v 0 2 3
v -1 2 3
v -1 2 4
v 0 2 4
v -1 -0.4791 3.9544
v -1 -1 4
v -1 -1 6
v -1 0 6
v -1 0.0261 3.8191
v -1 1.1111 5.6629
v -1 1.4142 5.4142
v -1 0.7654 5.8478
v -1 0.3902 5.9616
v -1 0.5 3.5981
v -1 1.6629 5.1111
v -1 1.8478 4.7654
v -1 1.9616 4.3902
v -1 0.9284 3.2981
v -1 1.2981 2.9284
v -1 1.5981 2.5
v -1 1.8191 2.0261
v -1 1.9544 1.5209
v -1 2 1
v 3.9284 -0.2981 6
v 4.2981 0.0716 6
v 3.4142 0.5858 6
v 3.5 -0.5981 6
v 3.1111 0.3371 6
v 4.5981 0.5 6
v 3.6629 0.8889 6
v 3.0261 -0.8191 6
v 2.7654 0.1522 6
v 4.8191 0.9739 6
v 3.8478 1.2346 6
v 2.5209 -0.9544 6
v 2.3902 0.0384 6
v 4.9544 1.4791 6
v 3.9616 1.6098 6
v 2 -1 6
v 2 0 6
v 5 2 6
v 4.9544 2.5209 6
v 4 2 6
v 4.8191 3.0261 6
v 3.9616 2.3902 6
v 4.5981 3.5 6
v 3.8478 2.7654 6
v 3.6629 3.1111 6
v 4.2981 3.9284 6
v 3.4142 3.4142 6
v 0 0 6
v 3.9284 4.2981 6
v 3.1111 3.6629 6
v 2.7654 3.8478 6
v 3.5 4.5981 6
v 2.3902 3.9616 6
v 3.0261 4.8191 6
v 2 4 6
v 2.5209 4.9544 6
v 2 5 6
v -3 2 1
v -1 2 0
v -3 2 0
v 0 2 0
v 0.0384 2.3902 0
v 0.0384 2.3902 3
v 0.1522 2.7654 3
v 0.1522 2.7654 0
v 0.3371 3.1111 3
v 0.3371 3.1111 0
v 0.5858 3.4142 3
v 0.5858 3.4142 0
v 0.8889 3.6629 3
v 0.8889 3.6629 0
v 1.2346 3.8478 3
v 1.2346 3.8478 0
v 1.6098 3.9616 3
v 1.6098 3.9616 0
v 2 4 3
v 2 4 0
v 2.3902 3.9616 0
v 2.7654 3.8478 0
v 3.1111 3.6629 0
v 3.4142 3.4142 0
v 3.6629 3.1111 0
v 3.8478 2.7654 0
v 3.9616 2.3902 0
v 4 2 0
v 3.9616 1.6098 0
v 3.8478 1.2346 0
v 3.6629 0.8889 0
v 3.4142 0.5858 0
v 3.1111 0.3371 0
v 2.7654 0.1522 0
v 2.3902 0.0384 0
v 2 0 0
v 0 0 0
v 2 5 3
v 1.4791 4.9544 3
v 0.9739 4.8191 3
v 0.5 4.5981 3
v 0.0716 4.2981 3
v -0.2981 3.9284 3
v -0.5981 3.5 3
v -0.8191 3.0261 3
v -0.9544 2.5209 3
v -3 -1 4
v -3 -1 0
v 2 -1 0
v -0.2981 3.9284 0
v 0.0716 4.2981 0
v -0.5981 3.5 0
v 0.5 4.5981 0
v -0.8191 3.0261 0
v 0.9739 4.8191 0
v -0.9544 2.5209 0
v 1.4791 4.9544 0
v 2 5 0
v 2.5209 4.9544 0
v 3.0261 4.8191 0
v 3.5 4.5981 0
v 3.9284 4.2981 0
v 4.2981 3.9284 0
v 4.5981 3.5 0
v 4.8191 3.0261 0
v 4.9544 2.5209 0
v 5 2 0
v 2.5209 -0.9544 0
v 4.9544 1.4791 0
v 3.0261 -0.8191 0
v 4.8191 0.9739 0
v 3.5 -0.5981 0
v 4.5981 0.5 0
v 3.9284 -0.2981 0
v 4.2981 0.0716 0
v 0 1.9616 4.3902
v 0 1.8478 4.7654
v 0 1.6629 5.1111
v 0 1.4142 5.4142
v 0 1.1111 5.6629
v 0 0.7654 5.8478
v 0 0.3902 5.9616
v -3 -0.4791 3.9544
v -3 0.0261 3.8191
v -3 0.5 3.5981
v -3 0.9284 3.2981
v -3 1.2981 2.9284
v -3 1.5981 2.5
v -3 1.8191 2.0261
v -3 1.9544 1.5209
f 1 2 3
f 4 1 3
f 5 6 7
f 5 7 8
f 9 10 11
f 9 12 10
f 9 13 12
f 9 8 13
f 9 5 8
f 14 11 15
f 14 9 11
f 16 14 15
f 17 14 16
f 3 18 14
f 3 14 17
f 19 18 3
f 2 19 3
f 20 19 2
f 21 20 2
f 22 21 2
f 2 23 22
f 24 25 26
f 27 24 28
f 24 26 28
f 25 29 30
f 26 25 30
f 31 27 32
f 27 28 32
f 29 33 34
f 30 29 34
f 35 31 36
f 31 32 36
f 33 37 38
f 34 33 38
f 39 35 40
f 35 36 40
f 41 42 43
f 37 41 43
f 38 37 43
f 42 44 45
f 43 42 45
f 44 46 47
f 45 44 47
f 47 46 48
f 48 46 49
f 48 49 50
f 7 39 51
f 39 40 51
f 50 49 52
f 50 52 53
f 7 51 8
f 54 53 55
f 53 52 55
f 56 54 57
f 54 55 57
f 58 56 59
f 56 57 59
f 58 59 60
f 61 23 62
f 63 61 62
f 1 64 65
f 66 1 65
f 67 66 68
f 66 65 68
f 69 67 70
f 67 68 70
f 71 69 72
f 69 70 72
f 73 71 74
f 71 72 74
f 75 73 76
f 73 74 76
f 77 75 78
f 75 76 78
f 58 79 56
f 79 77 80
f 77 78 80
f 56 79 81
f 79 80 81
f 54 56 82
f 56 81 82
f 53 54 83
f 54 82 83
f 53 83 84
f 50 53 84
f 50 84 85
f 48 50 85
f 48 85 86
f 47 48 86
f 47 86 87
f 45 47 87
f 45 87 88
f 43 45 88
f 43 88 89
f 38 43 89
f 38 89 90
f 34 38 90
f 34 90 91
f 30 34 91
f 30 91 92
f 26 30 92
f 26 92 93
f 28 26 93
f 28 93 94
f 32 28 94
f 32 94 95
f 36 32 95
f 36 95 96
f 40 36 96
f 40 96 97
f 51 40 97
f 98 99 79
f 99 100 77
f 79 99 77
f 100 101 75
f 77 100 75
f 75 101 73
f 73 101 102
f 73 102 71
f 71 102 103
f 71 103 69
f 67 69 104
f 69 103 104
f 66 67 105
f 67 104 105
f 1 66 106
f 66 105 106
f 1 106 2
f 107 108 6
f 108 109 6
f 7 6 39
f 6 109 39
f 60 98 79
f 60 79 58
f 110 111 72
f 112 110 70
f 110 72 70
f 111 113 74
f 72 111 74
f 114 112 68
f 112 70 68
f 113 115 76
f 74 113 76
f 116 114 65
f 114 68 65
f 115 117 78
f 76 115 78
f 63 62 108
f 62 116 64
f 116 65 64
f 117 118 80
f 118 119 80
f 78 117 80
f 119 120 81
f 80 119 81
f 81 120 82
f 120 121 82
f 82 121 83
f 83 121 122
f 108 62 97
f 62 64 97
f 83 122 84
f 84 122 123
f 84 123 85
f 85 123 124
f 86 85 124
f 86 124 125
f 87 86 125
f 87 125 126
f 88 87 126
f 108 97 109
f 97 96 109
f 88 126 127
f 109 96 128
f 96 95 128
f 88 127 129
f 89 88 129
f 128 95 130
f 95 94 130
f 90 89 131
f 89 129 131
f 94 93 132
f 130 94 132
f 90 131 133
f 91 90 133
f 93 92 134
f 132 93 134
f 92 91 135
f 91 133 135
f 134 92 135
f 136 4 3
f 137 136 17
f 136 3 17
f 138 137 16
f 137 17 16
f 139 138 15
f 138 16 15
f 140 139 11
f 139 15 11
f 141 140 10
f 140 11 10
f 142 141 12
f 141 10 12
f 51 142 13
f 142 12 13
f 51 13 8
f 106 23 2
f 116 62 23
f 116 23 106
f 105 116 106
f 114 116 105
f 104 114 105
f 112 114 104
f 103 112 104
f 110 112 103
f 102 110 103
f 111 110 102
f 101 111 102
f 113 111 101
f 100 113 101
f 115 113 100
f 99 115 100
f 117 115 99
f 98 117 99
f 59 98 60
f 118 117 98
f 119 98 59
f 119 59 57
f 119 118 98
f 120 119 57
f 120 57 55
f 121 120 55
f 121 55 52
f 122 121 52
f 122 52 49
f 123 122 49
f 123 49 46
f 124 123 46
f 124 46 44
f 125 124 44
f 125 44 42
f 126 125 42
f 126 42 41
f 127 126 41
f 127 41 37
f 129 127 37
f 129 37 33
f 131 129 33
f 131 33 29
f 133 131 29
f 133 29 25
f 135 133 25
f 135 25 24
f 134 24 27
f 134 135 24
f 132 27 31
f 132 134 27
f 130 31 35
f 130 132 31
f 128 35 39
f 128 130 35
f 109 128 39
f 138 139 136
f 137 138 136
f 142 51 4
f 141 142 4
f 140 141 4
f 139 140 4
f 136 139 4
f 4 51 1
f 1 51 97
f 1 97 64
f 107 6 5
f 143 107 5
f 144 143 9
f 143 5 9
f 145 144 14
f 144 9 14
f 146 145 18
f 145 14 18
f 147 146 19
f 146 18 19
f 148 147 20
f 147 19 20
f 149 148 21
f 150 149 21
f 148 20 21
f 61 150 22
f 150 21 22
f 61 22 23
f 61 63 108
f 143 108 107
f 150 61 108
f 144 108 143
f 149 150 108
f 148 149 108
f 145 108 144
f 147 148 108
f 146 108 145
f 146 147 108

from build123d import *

# Parameters (mm, degrees)
BOSS_EXTRUDE1_DEPTH = 6
BOSS_EXTRUDE2_DEPTH = 2
CUT_EXTRUDE1_DEPTH  = 3


with BuildPart() as part:
    # Sketch2 → Boss-Extrude1 (new body)
    with BuildSketch(Plane.XY):
        with BuildLine():
            ThreePointArc((-1, 2), (4.121320344, 4.121320344), (2, -1))
            Line((2, -1), (-1, -1))
            Line((-1, -1), (-1, 2))
        make_face()
        with BuildLine():
            Line((0, 0), (0, 2))
            ThreePointArc((0, 2), (3.414213562, 3.414213562), (2, 0))
            Line((2, 0), (0, 0))
        make_face(mode=Mode.SUBTRACT)
    extrude(amount=BOSS_EXTRUDE1_DEPTH)

    # Sketch3 → Boss-Extrude2 (add)
    with BuildSketch(Plane.ZY.offset(1)):
        with BuildLine():
            Line((0, 2), (0, -1))
            Line((0, -1), (4, -1))
            ThreePointArc((4, -1), (3.121320344, 1.121320344), (1, 2))
            Line((1, 2), (0, 2))
        make_face()
    extrude(amount=BOSS_EXTRUDE2_DEPTH)

    # Sketch4 → Cut-Extrude1 (cut)
    with BuildSketch(Plane.ZY.offset(1)):
        with BuildLine():
            Line((3, 2), (4, 2))
            ThreePointArc((4, 2), (5.414213562, 1.414213562), (6, 0))
            Line((6, 0), (6, 5))
            Line((6, 5), (3, 5))
            Line((3, 5), (3, 2))
        make_face()
    extrude(amount=-CUT_EXTRUDE1_DEPTH, mode=Mode.SUBTRACT)


solid = part.part
